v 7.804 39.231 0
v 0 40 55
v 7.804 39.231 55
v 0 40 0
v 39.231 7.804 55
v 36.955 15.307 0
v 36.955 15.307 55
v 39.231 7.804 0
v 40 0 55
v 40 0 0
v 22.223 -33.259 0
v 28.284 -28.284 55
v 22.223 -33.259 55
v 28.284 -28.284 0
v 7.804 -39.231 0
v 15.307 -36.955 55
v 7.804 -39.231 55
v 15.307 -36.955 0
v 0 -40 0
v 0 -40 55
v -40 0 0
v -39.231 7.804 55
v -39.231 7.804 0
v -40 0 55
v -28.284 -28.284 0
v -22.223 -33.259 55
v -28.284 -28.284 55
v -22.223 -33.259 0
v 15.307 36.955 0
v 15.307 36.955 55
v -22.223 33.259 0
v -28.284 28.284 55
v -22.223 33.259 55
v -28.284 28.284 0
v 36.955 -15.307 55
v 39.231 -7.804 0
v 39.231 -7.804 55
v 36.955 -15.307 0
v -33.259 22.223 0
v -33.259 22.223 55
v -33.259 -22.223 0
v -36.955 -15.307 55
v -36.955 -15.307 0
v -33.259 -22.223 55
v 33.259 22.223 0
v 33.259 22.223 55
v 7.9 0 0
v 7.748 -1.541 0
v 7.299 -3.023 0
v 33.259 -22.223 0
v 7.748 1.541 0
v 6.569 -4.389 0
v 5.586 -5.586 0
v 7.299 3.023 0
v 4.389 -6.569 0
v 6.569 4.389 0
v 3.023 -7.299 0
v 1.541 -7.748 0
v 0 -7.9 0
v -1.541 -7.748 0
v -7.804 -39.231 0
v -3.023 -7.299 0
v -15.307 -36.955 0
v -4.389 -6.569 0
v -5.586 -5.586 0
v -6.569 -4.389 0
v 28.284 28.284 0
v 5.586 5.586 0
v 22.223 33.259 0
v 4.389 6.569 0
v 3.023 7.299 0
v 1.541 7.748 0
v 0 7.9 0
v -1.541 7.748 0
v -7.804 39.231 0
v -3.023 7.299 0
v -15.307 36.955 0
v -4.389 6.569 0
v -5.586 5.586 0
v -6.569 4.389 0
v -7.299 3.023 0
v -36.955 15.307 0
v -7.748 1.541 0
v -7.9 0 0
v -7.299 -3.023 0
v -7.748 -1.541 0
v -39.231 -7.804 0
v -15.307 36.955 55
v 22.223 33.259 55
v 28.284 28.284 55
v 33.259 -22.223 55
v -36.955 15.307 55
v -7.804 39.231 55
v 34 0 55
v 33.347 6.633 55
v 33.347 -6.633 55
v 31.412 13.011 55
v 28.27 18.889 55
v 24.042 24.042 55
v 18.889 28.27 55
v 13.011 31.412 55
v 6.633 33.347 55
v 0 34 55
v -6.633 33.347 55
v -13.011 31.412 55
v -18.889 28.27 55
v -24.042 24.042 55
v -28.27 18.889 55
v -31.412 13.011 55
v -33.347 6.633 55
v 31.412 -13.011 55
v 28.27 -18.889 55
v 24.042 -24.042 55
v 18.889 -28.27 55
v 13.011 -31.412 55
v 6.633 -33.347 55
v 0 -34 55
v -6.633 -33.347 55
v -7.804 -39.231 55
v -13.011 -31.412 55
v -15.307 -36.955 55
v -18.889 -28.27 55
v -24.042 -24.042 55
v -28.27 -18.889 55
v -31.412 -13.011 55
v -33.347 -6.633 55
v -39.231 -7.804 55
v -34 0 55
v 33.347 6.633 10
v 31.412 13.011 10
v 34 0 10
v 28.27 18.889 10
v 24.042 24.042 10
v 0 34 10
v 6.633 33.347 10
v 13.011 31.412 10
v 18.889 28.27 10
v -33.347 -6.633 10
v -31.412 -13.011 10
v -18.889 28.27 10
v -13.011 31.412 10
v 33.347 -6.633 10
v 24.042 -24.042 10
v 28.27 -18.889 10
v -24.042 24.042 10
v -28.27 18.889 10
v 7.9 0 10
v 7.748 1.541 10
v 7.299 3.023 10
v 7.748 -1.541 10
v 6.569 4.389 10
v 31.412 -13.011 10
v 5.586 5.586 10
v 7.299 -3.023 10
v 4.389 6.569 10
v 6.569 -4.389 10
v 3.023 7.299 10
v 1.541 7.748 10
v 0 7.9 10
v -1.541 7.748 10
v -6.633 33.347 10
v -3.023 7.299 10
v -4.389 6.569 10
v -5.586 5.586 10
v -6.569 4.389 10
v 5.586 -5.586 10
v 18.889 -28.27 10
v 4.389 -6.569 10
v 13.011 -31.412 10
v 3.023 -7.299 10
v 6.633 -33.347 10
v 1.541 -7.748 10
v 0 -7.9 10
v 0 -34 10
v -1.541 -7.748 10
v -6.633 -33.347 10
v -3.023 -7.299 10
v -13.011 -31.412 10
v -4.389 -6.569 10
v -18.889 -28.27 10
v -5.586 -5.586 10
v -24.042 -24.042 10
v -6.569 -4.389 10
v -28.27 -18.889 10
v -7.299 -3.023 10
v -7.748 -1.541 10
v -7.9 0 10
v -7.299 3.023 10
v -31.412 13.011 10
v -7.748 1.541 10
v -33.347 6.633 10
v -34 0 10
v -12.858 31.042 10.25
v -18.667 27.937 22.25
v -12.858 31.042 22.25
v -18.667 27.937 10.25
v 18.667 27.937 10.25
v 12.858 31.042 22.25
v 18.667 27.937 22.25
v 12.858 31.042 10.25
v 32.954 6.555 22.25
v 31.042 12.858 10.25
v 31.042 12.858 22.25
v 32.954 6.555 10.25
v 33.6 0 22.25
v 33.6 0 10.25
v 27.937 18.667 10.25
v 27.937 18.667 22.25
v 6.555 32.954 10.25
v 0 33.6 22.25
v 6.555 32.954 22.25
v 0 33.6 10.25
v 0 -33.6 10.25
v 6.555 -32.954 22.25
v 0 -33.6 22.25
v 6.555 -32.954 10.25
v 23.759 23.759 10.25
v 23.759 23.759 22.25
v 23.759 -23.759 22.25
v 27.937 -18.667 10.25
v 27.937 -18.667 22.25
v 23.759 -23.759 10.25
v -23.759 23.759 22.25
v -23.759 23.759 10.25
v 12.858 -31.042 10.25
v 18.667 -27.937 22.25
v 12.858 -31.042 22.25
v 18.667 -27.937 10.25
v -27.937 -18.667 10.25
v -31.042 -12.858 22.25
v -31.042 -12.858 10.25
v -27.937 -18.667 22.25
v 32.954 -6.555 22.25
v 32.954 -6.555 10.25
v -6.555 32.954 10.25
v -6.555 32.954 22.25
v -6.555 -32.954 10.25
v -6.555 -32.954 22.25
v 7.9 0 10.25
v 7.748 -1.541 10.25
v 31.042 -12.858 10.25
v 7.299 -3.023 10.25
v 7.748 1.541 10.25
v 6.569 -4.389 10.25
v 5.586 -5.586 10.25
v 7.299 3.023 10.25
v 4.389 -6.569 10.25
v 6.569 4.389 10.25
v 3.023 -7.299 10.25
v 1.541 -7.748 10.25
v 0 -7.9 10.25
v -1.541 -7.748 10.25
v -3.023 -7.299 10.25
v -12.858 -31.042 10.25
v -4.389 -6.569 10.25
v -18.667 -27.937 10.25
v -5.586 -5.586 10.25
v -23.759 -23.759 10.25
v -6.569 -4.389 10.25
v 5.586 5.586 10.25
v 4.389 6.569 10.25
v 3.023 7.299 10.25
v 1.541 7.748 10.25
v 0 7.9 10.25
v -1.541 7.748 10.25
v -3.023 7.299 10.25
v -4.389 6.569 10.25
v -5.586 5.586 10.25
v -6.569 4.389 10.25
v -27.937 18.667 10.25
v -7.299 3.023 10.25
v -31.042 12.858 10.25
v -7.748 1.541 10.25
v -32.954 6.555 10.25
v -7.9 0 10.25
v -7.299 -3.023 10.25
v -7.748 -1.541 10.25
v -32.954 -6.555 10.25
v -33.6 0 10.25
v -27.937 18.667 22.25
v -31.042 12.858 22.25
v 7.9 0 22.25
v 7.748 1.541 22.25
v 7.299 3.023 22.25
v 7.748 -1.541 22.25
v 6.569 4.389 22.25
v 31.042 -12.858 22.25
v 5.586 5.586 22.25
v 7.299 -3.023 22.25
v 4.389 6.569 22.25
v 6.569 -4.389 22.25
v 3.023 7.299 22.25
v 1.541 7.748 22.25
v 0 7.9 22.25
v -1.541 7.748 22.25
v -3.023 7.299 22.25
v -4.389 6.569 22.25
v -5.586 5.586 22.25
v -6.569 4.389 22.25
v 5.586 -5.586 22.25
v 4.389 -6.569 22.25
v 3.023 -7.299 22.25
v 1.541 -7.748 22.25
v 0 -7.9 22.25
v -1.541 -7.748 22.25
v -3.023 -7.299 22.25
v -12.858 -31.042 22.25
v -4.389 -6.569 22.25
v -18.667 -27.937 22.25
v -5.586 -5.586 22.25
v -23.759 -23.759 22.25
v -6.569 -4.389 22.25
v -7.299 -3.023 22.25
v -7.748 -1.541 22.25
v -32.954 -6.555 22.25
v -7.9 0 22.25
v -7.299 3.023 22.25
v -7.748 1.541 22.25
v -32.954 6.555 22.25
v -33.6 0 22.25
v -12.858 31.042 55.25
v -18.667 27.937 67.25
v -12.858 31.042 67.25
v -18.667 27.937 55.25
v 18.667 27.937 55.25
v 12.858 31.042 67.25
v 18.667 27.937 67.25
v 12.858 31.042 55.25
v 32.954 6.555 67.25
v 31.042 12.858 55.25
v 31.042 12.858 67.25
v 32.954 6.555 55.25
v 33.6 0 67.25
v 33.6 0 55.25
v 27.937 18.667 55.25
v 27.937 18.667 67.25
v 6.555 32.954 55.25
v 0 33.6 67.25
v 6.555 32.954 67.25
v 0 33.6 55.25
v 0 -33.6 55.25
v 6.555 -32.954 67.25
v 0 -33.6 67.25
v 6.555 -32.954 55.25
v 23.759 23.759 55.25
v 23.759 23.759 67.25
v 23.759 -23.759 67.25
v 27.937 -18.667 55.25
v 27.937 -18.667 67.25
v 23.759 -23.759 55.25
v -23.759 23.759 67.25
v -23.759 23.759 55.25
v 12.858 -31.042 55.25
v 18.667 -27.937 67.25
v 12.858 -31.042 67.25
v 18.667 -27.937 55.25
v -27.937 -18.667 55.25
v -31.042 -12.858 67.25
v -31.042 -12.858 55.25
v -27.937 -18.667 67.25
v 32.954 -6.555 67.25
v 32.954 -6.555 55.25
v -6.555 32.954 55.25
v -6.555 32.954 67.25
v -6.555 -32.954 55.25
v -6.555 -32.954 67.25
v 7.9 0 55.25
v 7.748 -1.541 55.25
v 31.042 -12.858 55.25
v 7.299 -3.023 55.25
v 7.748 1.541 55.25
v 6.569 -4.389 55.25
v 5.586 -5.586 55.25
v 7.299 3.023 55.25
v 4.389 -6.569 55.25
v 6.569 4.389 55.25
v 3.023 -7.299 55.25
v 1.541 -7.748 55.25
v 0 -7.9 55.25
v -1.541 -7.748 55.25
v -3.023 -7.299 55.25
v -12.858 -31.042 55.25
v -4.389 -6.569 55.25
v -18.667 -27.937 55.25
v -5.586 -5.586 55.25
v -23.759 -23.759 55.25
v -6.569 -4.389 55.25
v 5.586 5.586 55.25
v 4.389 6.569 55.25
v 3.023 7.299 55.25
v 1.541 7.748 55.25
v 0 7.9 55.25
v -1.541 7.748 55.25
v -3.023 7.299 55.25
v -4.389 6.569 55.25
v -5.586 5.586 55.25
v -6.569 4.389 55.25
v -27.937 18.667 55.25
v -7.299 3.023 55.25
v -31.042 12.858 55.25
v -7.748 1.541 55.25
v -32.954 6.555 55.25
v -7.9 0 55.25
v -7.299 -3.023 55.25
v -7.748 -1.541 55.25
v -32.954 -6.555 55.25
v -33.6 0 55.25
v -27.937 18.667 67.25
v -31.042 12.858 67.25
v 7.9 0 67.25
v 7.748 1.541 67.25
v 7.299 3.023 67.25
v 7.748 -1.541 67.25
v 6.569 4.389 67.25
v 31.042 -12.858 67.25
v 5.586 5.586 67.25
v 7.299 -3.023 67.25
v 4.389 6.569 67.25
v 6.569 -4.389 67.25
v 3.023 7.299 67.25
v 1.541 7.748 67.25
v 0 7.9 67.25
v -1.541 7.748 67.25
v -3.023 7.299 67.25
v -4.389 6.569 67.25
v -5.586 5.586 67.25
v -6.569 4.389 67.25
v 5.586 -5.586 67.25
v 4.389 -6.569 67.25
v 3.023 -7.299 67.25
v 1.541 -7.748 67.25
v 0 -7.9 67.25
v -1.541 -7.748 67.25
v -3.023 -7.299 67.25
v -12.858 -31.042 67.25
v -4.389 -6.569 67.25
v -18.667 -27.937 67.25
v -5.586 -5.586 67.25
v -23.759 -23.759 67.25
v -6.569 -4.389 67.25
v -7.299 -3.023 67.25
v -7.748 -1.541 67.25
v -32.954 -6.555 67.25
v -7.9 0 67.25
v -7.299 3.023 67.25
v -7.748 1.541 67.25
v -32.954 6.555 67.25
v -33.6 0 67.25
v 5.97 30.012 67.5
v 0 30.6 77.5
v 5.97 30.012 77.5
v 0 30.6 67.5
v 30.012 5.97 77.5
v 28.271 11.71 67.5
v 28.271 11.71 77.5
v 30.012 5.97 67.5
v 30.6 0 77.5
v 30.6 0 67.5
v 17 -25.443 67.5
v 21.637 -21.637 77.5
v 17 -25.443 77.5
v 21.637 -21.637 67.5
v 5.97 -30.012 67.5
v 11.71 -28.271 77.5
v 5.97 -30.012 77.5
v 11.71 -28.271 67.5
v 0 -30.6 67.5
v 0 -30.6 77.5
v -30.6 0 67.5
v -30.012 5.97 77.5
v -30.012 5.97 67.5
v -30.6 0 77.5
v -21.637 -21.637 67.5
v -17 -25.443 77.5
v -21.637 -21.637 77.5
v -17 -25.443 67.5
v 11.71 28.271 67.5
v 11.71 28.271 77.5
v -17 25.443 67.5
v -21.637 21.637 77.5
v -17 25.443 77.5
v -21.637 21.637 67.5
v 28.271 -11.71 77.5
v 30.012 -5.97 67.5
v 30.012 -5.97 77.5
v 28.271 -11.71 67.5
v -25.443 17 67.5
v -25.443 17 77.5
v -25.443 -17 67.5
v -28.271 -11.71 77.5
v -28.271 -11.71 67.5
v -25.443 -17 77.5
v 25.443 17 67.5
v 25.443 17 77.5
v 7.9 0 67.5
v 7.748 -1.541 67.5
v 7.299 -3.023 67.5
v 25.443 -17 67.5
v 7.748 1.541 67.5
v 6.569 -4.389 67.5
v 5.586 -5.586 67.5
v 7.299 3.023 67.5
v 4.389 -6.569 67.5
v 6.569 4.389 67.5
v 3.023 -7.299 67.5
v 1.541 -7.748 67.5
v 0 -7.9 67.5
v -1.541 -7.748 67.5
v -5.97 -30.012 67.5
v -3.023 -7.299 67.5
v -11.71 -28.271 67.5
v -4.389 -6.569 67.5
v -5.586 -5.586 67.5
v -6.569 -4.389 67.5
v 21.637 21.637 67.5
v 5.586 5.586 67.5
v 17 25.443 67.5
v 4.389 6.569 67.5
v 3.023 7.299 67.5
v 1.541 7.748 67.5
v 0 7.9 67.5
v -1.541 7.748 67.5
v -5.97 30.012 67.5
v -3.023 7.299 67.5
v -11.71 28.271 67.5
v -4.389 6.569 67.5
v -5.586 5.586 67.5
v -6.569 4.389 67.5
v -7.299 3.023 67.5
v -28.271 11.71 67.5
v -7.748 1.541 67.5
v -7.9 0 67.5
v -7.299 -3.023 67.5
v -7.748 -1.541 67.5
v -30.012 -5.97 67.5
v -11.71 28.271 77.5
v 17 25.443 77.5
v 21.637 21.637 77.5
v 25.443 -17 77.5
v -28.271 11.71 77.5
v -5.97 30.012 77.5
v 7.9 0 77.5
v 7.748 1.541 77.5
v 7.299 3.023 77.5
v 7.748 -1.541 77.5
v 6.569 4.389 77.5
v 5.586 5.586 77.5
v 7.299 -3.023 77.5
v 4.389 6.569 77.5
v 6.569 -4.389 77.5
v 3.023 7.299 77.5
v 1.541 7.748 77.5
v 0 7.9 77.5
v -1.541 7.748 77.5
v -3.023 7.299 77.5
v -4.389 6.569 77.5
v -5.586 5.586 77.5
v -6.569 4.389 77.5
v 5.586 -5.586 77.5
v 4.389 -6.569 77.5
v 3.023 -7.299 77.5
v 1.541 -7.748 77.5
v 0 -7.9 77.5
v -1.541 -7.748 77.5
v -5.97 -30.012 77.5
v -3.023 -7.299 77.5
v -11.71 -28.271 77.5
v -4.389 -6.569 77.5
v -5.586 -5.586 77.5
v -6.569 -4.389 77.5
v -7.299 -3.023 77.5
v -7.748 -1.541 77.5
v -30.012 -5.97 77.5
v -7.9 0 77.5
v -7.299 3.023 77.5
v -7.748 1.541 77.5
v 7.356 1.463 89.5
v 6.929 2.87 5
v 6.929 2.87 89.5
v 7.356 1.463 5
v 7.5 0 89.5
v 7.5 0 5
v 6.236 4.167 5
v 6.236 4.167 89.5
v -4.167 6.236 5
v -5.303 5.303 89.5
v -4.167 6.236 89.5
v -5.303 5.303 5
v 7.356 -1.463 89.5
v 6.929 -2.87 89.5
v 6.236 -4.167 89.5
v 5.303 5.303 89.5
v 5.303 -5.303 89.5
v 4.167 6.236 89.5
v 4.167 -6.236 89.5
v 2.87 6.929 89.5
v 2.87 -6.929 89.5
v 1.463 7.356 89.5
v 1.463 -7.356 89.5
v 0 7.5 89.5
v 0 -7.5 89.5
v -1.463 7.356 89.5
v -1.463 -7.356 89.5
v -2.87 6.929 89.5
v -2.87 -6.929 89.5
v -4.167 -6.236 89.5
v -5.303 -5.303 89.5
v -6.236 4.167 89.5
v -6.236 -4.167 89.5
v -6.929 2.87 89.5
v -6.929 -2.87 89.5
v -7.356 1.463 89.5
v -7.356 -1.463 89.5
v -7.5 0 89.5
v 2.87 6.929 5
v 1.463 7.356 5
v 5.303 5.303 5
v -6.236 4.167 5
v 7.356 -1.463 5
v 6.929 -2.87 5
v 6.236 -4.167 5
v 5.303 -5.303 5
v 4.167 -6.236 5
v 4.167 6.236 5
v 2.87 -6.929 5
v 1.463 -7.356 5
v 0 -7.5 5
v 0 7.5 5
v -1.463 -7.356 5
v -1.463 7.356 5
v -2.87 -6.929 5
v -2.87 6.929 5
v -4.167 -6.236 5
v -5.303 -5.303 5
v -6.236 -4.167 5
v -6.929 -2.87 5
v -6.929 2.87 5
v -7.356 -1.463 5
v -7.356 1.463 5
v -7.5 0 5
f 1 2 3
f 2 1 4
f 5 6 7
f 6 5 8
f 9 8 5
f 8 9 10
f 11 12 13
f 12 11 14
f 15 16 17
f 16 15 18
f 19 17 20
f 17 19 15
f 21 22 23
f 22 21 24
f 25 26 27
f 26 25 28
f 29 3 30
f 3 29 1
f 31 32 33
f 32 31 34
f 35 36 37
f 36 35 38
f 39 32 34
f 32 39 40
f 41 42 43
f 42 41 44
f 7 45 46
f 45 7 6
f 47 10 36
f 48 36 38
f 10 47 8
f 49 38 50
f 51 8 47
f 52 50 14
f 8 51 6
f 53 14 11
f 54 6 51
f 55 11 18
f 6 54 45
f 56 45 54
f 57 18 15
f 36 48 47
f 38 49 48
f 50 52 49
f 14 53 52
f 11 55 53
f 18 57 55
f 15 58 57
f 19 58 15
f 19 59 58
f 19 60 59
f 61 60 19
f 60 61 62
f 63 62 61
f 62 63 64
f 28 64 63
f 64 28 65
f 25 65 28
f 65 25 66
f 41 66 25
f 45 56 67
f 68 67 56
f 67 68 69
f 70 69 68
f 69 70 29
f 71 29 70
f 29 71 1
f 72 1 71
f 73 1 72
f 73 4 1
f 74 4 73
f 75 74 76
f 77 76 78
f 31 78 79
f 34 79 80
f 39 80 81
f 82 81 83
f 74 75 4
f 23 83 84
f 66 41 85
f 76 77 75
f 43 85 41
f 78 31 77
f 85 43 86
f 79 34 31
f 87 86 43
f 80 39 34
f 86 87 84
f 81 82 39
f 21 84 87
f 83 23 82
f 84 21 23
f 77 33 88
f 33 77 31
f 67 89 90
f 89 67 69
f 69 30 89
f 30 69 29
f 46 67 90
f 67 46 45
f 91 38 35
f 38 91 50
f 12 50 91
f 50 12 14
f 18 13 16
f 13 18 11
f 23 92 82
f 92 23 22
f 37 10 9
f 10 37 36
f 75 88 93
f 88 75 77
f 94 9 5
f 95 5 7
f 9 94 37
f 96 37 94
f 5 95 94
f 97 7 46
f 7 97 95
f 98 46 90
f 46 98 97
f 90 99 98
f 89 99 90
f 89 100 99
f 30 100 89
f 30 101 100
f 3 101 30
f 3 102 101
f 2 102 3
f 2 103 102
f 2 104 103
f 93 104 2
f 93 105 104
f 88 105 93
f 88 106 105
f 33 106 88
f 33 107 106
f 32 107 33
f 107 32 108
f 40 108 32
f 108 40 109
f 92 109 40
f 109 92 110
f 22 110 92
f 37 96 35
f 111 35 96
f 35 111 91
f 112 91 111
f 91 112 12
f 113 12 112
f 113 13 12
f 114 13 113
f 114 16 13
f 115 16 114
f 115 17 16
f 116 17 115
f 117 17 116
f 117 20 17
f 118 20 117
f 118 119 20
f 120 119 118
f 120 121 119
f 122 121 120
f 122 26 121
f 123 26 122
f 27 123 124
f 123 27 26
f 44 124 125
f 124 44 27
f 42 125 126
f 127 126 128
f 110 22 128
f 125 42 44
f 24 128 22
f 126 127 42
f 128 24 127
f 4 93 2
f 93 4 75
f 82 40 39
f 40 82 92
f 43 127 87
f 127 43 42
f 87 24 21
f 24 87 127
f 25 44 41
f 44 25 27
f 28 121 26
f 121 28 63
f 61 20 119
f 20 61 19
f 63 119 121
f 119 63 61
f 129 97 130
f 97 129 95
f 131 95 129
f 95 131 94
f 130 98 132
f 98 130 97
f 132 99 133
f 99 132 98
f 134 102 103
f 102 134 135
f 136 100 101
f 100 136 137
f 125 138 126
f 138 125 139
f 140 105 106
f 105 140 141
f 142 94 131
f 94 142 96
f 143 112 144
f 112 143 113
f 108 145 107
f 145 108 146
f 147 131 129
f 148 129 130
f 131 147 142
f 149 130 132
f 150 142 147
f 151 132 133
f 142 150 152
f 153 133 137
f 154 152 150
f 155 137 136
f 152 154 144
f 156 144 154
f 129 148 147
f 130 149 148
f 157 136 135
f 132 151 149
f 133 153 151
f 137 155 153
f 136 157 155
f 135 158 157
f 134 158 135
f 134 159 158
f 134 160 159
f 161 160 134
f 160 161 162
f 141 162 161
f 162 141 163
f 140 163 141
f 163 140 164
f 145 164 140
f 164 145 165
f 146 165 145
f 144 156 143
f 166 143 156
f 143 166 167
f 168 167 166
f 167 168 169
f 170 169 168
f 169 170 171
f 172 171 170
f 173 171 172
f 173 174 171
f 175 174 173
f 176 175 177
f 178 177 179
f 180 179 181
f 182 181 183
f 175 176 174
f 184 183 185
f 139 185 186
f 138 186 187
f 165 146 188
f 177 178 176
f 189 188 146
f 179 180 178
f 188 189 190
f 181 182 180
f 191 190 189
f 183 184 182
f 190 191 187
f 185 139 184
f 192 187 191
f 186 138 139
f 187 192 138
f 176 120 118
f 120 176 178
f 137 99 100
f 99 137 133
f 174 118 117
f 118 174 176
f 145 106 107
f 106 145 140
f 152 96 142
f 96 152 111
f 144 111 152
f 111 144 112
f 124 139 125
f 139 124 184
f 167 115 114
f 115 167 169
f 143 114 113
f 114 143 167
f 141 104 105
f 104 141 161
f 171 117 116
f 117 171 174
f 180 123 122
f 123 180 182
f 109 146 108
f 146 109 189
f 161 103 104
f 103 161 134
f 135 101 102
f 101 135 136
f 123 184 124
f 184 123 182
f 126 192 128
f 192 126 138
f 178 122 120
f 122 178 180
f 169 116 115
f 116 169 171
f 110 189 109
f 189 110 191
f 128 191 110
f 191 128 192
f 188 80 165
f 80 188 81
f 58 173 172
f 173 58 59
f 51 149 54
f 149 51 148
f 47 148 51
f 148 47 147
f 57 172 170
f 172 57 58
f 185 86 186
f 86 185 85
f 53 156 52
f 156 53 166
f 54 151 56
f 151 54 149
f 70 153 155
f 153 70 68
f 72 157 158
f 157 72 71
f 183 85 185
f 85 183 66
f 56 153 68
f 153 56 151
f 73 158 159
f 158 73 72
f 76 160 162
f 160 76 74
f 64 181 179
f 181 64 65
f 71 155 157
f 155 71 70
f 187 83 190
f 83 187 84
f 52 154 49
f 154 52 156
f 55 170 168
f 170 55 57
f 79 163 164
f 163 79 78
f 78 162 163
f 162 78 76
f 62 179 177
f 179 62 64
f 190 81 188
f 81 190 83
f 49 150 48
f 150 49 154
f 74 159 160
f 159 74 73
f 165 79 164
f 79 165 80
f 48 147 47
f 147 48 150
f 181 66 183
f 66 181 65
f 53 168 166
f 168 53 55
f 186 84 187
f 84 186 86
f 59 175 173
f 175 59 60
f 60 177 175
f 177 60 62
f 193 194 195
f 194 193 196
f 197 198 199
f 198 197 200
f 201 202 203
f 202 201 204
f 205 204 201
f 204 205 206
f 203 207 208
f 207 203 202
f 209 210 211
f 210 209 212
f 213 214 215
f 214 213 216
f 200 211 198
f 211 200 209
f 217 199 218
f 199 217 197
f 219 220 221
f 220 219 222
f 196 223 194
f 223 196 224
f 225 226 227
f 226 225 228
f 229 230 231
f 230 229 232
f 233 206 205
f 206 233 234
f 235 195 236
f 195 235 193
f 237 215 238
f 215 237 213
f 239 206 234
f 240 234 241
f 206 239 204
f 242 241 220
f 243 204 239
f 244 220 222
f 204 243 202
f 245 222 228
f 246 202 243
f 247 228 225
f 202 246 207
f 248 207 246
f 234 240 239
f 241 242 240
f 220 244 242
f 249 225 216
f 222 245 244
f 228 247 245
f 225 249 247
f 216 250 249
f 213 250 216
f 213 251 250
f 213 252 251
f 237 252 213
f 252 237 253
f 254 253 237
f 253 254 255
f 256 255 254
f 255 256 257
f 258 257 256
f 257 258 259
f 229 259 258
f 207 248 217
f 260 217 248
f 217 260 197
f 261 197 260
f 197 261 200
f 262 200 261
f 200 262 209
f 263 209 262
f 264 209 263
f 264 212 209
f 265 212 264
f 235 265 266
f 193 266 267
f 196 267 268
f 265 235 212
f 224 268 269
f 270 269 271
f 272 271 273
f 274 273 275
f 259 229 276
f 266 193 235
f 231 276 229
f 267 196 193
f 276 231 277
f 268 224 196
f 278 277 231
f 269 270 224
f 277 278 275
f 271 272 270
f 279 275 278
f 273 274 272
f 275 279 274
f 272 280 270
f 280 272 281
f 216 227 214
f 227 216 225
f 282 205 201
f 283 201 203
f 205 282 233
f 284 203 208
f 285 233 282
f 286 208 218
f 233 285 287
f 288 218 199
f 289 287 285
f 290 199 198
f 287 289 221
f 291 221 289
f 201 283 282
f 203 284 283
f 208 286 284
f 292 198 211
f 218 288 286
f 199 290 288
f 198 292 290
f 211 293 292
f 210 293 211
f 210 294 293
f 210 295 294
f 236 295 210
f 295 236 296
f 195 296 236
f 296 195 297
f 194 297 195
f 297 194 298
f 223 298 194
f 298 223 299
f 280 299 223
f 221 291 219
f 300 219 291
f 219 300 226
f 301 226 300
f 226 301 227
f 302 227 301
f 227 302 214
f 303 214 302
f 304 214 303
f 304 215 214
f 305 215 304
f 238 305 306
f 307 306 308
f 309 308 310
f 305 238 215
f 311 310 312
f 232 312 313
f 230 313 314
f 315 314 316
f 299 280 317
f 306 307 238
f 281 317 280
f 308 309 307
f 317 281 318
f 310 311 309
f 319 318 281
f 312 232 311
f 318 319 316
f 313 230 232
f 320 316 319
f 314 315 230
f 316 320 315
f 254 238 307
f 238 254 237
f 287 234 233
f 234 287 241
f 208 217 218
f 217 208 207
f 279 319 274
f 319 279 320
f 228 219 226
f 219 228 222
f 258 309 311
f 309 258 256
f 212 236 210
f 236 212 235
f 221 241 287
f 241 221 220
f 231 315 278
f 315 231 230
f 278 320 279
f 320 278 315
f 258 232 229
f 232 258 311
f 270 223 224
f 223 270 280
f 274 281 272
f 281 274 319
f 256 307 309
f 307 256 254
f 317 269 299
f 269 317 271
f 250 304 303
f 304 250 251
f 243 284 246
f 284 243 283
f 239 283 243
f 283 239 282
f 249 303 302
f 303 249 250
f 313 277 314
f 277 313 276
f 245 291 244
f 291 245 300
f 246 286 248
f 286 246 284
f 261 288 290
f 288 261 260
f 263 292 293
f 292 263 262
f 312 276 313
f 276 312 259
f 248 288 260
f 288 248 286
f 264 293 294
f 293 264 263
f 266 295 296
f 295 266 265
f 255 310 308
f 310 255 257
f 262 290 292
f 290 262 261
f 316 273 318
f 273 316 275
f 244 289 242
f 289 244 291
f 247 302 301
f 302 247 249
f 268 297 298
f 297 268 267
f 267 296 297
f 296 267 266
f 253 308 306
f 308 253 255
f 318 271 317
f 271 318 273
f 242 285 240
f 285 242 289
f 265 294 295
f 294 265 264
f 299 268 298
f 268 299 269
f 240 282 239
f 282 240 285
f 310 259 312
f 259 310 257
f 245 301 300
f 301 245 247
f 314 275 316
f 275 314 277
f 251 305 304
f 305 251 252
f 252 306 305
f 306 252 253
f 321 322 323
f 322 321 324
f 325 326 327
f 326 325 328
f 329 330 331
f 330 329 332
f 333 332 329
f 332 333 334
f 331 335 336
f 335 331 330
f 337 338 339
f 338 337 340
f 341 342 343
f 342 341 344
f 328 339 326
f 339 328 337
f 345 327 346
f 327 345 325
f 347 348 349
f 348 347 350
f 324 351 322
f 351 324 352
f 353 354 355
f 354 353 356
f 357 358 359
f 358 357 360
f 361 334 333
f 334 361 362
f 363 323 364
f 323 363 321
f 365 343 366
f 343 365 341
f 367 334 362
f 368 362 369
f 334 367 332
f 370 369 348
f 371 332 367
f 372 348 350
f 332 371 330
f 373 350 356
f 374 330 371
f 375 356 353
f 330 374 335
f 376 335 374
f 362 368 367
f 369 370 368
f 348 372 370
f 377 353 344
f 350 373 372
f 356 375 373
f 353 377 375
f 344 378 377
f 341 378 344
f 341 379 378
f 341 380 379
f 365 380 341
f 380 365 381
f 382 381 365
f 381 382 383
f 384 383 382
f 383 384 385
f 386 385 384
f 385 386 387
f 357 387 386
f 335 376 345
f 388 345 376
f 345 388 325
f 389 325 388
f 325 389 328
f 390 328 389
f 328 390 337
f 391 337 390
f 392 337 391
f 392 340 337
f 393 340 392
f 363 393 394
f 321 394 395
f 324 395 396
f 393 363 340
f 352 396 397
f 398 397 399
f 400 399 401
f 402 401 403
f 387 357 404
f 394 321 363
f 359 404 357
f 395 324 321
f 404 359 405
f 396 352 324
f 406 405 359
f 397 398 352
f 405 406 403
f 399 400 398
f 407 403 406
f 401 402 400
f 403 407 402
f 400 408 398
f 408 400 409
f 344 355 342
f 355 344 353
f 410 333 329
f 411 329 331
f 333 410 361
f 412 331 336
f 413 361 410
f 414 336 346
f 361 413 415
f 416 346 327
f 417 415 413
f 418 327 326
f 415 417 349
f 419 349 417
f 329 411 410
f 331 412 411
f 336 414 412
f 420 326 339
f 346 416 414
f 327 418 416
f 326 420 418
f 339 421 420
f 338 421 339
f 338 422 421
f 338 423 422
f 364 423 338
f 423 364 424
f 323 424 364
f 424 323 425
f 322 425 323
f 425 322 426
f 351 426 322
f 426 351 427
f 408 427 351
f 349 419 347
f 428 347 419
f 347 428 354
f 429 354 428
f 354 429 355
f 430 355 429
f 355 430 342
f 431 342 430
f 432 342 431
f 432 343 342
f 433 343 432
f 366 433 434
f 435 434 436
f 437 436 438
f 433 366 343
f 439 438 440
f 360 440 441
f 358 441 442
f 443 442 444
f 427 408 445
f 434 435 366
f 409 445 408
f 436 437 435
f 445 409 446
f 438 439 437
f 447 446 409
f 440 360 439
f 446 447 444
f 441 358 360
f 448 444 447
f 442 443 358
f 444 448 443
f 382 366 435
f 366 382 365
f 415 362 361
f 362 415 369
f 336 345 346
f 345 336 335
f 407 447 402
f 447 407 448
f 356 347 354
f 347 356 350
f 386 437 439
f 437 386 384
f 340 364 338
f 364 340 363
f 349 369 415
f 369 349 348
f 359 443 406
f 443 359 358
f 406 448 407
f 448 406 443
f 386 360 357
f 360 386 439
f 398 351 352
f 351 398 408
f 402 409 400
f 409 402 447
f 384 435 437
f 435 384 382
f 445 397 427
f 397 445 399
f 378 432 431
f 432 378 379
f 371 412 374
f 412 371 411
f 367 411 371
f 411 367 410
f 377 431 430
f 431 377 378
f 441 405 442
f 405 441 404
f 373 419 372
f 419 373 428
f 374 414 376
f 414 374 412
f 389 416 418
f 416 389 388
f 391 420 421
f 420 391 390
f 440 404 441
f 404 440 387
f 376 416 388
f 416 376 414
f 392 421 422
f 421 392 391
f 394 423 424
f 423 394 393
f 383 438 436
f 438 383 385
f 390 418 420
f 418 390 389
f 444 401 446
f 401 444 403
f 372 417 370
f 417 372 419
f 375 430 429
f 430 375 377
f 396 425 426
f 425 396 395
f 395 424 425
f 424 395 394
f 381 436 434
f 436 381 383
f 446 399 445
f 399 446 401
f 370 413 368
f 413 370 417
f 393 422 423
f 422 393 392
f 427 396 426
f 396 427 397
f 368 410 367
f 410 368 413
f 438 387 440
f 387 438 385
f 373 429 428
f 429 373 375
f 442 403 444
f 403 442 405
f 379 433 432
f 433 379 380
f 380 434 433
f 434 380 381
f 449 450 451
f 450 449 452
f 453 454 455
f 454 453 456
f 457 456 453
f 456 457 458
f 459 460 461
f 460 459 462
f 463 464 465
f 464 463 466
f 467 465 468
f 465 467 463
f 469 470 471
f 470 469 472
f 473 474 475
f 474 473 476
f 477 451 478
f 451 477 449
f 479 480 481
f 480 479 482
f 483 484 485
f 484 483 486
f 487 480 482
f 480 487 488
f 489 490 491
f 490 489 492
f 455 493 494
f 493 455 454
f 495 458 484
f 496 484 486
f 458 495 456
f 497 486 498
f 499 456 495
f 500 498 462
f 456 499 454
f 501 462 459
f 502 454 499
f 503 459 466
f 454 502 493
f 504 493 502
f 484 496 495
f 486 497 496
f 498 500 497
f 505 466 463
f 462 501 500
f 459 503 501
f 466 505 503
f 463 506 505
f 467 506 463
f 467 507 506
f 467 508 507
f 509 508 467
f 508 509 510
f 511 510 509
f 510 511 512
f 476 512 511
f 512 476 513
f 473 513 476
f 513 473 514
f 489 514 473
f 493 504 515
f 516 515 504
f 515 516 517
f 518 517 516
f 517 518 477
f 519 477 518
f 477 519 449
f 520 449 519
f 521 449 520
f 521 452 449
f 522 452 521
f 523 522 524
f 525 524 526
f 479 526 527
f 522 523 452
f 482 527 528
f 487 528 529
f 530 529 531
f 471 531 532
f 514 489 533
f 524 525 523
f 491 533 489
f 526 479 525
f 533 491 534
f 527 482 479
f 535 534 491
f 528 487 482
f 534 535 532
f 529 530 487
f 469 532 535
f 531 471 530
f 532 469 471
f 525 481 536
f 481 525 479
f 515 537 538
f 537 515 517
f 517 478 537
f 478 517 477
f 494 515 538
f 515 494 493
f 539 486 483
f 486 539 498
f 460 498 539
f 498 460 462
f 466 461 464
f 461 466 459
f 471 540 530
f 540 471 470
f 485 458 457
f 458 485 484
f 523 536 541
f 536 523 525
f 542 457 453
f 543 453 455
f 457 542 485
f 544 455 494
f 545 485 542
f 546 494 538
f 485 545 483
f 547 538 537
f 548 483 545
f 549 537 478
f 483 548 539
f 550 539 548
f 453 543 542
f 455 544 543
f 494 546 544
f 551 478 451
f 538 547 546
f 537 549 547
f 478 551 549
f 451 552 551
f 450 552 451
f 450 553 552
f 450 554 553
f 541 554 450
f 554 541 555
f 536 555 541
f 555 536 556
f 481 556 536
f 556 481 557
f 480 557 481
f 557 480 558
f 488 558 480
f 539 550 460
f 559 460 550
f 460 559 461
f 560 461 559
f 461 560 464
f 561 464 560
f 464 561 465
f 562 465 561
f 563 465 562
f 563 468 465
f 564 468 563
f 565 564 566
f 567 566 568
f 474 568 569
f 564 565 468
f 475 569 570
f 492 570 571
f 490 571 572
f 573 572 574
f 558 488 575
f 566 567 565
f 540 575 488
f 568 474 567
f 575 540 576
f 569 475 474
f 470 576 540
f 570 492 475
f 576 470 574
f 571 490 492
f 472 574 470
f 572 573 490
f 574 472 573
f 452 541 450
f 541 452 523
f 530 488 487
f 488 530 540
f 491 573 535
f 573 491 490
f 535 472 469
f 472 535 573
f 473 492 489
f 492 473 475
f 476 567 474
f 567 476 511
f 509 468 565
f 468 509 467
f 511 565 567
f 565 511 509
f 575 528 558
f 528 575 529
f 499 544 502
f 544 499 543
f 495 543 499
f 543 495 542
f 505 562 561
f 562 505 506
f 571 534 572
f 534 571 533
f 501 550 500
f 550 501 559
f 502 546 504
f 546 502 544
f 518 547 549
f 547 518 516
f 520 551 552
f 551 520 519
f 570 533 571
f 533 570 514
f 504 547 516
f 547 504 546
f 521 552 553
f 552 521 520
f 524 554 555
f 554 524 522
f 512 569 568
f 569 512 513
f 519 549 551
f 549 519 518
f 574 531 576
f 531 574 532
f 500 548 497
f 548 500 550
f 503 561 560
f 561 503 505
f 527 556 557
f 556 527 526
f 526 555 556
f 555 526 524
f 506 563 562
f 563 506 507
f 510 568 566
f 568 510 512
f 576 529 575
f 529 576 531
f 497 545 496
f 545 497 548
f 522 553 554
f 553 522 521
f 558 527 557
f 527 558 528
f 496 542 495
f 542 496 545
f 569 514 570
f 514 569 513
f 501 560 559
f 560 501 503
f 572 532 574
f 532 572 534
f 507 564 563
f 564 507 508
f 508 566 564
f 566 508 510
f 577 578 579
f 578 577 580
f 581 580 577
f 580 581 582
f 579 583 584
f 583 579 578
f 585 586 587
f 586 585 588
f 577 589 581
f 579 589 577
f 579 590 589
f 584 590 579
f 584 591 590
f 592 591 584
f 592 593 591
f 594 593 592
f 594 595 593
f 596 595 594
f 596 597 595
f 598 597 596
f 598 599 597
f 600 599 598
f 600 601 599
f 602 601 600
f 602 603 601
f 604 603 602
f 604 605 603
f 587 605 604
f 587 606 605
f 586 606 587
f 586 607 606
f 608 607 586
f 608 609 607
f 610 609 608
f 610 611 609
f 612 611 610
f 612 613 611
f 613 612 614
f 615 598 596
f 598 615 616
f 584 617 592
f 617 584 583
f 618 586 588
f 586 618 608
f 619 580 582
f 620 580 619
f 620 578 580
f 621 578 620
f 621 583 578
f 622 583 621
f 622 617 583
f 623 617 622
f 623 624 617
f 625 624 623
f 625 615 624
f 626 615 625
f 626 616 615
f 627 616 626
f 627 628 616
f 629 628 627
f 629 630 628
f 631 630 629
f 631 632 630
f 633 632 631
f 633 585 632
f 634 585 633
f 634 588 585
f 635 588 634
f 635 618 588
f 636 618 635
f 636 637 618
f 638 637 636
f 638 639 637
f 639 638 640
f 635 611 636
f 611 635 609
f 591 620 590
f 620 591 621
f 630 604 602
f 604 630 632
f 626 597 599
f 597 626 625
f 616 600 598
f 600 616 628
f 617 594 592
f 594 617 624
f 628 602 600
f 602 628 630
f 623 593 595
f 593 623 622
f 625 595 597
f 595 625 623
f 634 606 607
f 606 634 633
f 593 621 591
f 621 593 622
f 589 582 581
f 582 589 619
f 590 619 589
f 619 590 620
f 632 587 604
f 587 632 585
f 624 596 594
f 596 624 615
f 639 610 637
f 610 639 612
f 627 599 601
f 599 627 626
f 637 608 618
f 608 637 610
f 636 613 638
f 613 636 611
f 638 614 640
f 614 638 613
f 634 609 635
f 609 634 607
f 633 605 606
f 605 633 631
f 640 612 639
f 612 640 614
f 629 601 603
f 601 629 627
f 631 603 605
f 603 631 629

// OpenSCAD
$fn = 32;

// ------------------------------------------------------------------------
// Bearing housing: housing d80, two bearings and a shaft
// Every part is its own module, assembly() places them once.
// ------------------------------------------------------------------------

// --- part 1 ---
module housing() {
  difference() {
    cylinder(h = 55, d = 80);
    translate([0, 0, 10]) cylinder(h = 46, d = 68);
    translate([0, 0, -1]) cylinder(h = 12, d = 15.8);
  }
}

// --- part 2 ---
module bearing_lower() {
  difference() {
      translate([0, 0, 0]) cylinder(h = 12, d = 67.2);
      translate([0, 0, -1]) cylinder(h = 14, d = 15.8);
    }
}

// --- part 3 ---
module bearing_upper() {
  difference() {
      translate([0, 0, 0]) cylinder(h = 12, d = 67.2);
      translate([0, 0, -1]) cylinder(h = 14, d = 15.8);
    }
}

// --- part 4 ---
module spacer() {
  difference() {
      translate([0, 0, 0]) cylinder(h = 10, d = 61.2);
      translate([0, 0, -1]) cylinder(h = 12, d = 15.8);
    }
}

// --- part 5 ---
module shaft() {
  translate([0, 0, -42.25]) cylinder(h = 84.5, d = 15);
}

// --- assembly ---
module assembly() {
  translate([0, 0, 0]) rotate([0, 0, 0]) housing();
  translate([0, 0, 10.25]) rotate([0, 0, 0]) bearing_lower();
  translate([0, 0, 55.25]) rotate([0, 0, 0]) bearing_upper();
  translate([0, 0, 67.5]) rotate([0, 0, 0]) spacer();
  translate([0, 0, 47.25]) rotate([0, 0, 0]) shaft();
}

assembly();
